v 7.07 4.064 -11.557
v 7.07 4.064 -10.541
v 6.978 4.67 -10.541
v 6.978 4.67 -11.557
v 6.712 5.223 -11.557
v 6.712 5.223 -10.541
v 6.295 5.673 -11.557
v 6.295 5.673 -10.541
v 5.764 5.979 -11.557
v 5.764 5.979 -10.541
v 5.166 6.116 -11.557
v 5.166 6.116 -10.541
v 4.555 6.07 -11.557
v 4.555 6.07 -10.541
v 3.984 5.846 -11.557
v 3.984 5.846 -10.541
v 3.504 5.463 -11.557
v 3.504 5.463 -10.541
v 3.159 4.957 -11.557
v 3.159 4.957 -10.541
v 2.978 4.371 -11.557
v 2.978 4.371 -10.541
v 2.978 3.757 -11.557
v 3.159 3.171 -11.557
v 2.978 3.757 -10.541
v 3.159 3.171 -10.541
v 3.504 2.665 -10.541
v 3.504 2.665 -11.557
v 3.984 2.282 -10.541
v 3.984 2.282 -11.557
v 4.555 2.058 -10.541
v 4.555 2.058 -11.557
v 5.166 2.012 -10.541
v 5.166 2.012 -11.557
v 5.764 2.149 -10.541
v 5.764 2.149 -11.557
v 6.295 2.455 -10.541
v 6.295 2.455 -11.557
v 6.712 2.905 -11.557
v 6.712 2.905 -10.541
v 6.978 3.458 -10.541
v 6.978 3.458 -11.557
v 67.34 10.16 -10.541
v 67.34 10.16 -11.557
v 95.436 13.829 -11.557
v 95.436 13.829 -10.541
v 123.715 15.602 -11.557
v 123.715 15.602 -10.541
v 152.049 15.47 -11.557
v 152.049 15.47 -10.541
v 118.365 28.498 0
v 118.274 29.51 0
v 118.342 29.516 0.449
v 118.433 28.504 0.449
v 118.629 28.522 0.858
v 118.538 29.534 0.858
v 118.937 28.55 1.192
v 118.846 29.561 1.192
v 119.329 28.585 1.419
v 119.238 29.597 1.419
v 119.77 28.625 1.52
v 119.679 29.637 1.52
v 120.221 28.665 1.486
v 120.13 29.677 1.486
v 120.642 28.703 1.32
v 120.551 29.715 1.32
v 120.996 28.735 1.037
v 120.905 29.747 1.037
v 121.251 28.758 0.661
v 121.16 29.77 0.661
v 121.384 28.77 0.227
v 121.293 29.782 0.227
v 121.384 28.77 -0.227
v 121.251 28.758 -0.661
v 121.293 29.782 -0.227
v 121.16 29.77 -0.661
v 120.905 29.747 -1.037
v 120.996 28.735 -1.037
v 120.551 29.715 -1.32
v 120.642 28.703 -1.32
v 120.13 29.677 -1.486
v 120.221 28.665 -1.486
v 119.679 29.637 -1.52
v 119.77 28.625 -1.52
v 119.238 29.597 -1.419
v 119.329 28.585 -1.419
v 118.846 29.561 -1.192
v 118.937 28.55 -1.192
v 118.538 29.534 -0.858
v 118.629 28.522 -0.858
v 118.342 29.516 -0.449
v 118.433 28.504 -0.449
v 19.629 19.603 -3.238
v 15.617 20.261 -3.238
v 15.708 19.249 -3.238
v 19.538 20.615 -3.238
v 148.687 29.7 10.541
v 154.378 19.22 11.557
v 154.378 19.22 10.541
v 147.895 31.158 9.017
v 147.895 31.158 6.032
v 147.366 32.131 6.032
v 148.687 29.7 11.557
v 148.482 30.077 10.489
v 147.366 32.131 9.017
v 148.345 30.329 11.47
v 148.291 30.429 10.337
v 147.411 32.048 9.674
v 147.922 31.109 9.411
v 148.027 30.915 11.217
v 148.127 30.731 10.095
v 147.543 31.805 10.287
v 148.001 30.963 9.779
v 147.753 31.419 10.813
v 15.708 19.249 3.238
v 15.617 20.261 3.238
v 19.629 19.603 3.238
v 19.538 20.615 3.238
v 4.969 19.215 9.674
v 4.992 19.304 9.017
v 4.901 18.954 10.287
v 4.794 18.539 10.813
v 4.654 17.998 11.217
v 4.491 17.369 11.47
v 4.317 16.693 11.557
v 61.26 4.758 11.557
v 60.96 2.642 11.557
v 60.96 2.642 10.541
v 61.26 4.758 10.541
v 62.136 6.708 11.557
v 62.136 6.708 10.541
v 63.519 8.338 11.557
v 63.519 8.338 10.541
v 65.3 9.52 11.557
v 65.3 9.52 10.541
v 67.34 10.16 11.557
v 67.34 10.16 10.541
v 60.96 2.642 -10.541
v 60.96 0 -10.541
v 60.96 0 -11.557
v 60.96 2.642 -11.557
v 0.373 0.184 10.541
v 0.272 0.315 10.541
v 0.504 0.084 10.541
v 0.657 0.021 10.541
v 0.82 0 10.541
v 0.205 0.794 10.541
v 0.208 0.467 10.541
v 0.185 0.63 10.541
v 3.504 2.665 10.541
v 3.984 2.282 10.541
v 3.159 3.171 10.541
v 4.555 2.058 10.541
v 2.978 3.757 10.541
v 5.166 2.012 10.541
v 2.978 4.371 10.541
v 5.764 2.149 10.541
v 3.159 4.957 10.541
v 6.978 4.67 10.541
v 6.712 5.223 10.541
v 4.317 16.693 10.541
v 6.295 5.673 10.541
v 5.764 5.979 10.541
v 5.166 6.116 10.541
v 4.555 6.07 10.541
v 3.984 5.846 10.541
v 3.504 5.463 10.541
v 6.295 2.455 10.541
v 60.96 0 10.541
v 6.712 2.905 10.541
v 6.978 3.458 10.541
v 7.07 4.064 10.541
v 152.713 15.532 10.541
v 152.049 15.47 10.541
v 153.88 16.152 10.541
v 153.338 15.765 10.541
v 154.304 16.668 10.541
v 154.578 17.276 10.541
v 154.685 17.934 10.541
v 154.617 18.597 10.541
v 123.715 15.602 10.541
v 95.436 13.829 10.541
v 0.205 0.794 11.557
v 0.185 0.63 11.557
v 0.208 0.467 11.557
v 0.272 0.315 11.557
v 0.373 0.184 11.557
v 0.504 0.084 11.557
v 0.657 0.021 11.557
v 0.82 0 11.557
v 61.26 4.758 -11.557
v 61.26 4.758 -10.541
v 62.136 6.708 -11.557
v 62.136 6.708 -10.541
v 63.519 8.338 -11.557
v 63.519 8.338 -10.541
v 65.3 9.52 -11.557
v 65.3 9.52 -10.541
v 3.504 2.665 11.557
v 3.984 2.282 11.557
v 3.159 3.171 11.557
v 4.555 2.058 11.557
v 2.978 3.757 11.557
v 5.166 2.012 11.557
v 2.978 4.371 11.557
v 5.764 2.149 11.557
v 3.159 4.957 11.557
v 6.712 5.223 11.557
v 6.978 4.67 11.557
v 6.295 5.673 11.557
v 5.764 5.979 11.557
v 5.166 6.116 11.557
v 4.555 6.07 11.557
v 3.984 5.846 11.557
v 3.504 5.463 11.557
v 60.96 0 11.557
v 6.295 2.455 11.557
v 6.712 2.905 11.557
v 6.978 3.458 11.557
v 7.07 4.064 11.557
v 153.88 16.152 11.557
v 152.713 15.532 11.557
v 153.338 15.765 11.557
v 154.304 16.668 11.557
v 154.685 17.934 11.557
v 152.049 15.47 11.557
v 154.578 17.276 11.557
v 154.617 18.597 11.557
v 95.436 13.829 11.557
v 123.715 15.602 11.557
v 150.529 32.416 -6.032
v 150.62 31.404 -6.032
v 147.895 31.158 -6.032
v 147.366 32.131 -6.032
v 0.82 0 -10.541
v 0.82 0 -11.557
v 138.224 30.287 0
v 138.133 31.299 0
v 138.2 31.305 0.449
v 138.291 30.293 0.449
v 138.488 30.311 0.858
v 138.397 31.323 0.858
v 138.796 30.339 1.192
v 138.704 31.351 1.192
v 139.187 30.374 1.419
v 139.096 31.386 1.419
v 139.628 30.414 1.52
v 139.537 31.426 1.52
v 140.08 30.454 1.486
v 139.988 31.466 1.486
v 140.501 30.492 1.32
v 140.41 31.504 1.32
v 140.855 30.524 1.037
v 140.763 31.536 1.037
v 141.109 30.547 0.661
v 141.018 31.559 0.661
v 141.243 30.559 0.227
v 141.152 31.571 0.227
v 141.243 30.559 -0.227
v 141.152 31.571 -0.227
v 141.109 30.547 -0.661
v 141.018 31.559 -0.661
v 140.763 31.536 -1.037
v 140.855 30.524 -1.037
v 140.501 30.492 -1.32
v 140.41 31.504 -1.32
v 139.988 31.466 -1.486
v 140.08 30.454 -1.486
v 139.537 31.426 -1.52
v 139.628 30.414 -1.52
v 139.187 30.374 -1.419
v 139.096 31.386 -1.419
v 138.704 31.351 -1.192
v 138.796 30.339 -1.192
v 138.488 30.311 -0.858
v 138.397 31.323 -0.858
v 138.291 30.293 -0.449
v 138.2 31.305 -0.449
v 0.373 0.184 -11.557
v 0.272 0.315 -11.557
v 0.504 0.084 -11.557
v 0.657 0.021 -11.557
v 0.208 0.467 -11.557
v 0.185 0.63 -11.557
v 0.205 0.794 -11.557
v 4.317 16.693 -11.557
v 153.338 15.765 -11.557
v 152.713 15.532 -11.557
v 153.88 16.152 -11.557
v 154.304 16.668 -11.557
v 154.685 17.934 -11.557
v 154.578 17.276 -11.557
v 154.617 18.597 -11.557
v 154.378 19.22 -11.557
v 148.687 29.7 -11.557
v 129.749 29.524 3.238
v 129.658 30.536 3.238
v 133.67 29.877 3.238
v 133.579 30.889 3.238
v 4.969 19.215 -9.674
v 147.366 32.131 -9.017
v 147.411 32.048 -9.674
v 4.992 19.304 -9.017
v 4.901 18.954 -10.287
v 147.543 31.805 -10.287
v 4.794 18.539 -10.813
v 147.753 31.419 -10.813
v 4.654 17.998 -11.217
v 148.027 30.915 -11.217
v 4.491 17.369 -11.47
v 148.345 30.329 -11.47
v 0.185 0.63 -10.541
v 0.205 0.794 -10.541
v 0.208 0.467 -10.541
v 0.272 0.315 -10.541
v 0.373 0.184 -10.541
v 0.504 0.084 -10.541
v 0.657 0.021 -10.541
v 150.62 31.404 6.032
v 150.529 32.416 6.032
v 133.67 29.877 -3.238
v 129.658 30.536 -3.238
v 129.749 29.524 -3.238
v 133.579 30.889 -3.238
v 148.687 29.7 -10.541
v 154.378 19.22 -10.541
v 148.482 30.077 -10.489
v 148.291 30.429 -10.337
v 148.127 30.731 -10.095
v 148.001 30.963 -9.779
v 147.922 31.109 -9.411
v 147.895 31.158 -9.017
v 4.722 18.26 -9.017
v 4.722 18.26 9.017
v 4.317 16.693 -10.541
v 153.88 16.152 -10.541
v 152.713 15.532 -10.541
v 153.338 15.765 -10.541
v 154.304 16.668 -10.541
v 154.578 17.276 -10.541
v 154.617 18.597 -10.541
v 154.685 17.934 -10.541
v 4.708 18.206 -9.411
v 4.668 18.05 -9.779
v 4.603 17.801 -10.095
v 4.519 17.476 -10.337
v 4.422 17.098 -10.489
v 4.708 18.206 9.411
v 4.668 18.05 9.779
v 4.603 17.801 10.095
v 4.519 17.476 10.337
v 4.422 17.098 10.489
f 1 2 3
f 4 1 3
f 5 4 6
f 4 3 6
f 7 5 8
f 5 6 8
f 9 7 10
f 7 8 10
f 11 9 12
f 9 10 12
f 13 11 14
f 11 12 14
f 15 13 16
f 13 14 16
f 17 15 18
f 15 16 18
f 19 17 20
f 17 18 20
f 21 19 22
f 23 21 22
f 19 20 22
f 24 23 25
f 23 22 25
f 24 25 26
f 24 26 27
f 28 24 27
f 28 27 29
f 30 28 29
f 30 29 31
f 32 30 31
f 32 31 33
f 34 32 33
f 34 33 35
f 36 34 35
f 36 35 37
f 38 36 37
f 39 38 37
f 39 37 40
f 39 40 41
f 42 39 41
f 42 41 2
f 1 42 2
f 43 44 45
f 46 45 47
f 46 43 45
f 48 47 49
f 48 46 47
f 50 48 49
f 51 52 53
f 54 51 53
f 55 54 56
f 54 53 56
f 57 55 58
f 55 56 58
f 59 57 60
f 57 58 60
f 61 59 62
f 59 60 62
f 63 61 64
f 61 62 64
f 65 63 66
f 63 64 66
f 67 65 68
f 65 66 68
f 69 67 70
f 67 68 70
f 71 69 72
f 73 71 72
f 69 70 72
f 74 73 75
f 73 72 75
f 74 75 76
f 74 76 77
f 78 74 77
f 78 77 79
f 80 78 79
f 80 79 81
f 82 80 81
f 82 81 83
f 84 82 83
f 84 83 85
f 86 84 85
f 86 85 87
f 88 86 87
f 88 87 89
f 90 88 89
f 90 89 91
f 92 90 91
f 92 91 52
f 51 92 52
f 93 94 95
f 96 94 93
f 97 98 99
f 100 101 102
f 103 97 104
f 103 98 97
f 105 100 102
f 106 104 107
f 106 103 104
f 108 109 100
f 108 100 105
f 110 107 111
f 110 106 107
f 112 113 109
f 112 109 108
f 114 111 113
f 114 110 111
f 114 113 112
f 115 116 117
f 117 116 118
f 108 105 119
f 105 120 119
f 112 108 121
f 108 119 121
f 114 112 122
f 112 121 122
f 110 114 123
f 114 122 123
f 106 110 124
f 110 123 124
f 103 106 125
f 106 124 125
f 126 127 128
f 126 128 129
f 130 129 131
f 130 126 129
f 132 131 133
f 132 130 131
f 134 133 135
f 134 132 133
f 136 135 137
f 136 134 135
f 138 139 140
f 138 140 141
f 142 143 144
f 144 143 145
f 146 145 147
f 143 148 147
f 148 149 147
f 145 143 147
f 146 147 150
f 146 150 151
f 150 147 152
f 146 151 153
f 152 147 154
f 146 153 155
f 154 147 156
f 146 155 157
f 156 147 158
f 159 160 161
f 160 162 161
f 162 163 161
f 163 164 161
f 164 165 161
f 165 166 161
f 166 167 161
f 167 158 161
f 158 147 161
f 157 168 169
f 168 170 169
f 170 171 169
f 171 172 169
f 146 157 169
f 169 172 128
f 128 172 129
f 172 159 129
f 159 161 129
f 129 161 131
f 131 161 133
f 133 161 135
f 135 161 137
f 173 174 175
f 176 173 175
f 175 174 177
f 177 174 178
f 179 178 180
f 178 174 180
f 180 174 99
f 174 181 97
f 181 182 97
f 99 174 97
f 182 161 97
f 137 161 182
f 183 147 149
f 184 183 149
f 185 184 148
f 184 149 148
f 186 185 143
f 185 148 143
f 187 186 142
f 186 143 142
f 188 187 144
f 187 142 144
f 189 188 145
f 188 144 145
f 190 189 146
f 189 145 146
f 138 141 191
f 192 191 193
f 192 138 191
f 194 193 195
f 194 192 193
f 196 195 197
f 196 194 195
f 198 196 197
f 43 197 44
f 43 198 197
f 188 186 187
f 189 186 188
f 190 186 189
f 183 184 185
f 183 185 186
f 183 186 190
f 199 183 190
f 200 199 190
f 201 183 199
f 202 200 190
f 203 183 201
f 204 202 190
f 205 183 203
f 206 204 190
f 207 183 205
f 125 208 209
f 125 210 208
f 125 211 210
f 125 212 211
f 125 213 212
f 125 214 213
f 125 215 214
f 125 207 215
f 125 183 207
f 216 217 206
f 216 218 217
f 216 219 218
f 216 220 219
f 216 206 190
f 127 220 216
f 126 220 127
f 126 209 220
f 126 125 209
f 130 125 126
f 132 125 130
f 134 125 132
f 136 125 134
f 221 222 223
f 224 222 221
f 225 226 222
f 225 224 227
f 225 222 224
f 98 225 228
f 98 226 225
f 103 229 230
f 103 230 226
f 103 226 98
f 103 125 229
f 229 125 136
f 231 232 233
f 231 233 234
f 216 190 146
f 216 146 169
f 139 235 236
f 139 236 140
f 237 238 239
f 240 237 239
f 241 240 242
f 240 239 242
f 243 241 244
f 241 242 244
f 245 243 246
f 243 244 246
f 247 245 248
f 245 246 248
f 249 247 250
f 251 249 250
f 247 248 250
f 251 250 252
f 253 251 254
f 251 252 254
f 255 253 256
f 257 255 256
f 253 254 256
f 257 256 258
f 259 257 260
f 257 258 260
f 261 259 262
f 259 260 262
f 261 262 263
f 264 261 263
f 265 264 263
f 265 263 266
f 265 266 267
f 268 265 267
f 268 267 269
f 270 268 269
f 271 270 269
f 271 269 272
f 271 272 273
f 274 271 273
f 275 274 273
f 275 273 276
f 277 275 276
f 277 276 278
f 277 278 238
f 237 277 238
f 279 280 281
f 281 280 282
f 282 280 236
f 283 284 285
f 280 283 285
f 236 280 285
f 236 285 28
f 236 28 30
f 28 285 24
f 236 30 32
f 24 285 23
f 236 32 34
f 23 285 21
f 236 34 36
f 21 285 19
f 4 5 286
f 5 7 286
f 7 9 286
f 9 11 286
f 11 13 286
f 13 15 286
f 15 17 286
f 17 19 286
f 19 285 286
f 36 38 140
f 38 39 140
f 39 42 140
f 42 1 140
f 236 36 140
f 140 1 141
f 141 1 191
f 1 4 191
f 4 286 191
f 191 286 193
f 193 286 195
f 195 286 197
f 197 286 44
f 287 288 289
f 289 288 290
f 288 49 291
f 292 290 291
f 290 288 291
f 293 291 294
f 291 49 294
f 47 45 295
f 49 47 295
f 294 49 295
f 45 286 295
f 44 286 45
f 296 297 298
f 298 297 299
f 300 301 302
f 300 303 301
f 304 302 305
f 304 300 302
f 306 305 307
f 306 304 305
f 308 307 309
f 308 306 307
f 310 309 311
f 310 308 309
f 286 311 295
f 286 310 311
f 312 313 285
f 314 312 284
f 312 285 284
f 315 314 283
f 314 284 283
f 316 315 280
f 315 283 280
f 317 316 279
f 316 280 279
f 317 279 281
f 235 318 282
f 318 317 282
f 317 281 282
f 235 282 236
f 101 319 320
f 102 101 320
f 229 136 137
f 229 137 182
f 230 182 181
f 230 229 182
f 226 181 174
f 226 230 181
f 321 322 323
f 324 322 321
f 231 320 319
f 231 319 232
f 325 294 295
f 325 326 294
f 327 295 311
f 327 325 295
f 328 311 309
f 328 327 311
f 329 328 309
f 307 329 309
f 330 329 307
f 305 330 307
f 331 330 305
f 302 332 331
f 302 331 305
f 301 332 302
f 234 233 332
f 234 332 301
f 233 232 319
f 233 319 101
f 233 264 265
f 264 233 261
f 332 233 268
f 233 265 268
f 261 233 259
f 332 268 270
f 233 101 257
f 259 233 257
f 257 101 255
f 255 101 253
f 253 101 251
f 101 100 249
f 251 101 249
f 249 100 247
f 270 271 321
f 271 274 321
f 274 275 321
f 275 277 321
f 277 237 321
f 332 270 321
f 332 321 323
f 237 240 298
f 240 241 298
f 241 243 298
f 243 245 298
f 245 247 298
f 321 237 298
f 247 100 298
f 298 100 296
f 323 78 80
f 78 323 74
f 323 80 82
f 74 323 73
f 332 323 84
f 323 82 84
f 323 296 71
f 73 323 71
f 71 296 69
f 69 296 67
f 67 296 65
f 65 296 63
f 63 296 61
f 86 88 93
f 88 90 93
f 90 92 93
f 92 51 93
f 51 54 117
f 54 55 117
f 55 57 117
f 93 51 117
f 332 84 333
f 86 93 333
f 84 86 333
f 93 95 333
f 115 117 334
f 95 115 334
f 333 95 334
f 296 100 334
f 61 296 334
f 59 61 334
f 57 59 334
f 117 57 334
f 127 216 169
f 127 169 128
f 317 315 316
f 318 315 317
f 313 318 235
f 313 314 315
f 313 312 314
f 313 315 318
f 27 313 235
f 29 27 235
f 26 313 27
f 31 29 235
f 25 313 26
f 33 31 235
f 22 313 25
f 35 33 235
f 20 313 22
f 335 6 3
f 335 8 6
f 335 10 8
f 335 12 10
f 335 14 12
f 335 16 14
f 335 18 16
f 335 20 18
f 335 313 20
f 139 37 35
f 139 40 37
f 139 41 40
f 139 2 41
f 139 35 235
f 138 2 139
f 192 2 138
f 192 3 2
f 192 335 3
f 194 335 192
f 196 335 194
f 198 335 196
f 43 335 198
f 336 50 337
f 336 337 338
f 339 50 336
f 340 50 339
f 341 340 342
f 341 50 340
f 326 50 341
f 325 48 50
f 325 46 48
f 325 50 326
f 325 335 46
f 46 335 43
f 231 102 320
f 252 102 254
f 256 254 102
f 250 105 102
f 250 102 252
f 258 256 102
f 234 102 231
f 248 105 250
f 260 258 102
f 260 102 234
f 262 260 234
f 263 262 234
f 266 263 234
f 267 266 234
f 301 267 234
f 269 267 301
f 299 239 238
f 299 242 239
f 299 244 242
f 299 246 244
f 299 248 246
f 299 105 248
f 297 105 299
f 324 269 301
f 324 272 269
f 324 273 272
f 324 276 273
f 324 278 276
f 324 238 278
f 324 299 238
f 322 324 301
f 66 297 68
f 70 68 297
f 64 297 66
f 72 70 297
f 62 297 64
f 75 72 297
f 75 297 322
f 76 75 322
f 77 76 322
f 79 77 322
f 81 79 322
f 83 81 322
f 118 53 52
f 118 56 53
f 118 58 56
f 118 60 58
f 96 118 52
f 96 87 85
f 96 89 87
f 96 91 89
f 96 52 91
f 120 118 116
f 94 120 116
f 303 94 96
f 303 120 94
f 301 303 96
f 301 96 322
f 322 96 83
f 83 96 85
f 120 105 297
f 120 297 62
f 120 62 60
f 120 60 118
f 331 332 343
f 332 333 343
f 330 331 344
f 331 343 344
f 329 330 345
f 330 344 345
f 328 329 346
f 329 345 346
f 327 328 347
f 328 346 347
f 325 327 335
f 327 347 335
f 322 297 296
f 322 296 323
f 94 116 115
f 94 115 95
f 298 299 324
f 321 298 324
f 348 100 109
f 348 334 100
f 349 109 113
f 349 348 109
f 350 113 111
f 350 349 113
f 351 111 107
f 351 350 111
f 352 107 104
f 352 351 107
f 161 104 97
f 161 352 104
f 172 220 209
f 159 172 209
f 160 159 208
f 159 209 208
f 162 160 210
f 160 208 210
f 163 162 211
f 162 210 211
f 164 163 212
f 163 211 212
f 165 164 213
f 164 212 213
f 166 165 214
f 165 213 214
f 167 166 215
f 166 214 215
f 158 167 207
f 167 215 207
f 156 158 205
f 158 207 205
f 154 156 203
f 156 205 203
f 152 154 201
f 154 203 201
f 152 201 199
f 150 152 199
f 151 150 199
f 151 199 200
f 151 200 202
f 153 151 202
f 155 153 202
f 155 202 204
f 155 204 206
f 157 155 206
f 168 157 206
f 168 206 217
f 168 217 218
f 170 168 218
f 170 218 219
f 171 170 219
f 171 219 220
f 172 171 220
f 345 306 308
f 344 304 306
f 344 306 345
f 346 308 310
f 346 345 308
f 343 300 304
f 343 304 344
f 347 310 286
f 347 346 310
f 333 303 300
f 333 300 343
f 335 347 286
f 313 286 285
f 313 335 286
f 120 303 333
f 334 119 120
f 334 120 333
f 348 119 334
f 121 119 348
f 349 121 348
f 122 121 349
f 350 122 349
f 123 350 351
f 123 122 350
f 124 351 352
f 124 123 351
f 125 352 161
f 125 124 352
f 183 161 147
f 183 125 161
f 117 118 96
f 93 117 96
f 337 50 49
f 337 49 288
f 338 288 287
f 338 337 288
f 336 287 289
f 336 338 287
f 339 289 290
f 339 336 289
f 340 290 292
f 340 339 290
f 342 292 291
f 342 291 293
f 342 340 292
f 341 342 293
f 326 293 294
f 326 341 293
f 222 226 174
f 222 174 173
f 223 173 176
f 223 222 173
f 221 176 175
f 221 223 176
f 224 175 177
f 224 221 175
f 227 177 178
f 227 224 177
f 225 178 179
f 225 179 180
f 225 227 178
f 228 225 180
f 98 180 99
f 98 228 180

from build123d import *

# Parameters (mm, degrees)
BOSS_EXTRUDE1_DEPTH = 11.557
FILLET1_R           = 2.54
FILLET2_R           = 0.635
SHELL1_T            = -1.016
SKETCH3_W           = 12.065
SKETCH3_H           = 1.016
BOSS_EXTRUDE2_DEPTH = 3.175
SKETCH4_R           = 1.524
SKETCH4_W           = 3.937
SKETCH4_H           = 6.477
CUT_EXTRUDE1_DEPTH  = 158.908914941
SKETCH5_R           = 2.0574
CUT_EXTRUDE2_DEPTH  = 160.727285329


with BuildPart() as part:
    # Sketch1 → Boss-Extrude1 (new, symmetric)
    with BuildSketch(Plane.XY):
        with BuildLine():
            Line((0, 0), (60.96, 0))
            Line((60.96, 0), (60.96, 2.641614405))
            ThreePointArc((60.96, 2.641614405), (62.769867337, 7.571802884), (67.339726625, 10.16))
            ThreePointArc((67.339726625, 10.16), (109.560204459, 14.953353711), (152.048769719, 15.469890784))
            ThreePointArc((152.048769719, 15.469890784), (154.303696185, 16.667899597), (154.378077788, 19.220229093))
            Line((154.378077788, 19.220229093), (147.366478068, 32.131))
            Line((147.366478068, 32.131), (4.991923978, 19.304))
            Line((4.991923978, 19.304), (0, 0))
        make_face()
    extrude(amount=BOSS_EXTRUDE1_DEPTH, both=True)

    # Fillet1
    fillet1_edges = [part.edges().sort_by_distance(p)[0] for p in [
        (76.179201023, 25.7175, -11.557),
        (76.179201023, 25.7175, 11.557),
    ]]
    fillet(fillet1_edges, radius=FILLET1_R)

    # Fillet2
    fillet2_edges = [part.edges().sort_by_distance(p)[0] for p in [
        (0, 0, 0),
    ]]
    fillet(fillet2_edges, radius=FILLET2_R)

    # Shell1
    shell1_openings = [part.faces().sort_by_distance(p)[0] for p in [
        (150.901052558, 25.62263054, 0),
        (154.303696185, 16.667899597, 0),
        (109.560204459, 14.953353711, 0),
        (60.96, 1.320807203, 0),
        (62.769867337, 7.571802884, 0),
        (30.890048092, 0, 0),
        (0.318012361, 0.246236787, 0),
        (2.583601555, 9.990906242, 0),
    ]]
    offset(amount=SHELL1_T, openings=shell1_openings, kind=Kind.INTERSECTION)

    # Sketch3 → Boss-Extrude2 (add)
    with BuildSketch(Plane(origin=(149.051444963, 13.428543441, 0), x_dir=(0, 0, -1), z_dir=(0.9959661345298199, 0.08972992181947408, 0))):
        with Locations((0, 18.270205313)):
            Rectangle(SKETCH3_W, SKETCH3_H)
    extrude(amount=BOSS_EXTRUDE2_DEPTH)

    # Sketch4 → Cut-Extrude1 (cut, through all)
    with BuildSketch(Plane(origin=(-1.684966895, 18.702456559, 0), x_dir=(0.9959661345298199, 0.08972992181947409, 0), z_dir=(-0.08972992181947409, 0.9959661345298199, 0))):
        with Locations((121.969133639, 0)):
            Circle(SKETCH4_R)
        with Locations((141.908133639, 0)):
            Circle(SKETCH4_R)
        with Locations((19.340433639, 0)):
            Rectangle(SKETCH4_W, SKETCH4_H)
        with Locations((133.843633639, 0)):
            Rectangle(SKETCH4_W, SKETCH4_H)
    extrude(amount=-CUT_EXTRUDE1_DEPTH, mode=Mode.SUBTRACT)

    # Sketch5 → Cut-Extrude2 (cut, through all)
    with BuildSketch(Plane.XY.offset(11.557)):
        with Locations((5.012495837, 4.064)):
            Circle(SKETCH5_R)
    extrude(amount=-CUT_EXTRUDE2_DEPTH, mode=Mode.SUBTRACT)


solid = part.part
